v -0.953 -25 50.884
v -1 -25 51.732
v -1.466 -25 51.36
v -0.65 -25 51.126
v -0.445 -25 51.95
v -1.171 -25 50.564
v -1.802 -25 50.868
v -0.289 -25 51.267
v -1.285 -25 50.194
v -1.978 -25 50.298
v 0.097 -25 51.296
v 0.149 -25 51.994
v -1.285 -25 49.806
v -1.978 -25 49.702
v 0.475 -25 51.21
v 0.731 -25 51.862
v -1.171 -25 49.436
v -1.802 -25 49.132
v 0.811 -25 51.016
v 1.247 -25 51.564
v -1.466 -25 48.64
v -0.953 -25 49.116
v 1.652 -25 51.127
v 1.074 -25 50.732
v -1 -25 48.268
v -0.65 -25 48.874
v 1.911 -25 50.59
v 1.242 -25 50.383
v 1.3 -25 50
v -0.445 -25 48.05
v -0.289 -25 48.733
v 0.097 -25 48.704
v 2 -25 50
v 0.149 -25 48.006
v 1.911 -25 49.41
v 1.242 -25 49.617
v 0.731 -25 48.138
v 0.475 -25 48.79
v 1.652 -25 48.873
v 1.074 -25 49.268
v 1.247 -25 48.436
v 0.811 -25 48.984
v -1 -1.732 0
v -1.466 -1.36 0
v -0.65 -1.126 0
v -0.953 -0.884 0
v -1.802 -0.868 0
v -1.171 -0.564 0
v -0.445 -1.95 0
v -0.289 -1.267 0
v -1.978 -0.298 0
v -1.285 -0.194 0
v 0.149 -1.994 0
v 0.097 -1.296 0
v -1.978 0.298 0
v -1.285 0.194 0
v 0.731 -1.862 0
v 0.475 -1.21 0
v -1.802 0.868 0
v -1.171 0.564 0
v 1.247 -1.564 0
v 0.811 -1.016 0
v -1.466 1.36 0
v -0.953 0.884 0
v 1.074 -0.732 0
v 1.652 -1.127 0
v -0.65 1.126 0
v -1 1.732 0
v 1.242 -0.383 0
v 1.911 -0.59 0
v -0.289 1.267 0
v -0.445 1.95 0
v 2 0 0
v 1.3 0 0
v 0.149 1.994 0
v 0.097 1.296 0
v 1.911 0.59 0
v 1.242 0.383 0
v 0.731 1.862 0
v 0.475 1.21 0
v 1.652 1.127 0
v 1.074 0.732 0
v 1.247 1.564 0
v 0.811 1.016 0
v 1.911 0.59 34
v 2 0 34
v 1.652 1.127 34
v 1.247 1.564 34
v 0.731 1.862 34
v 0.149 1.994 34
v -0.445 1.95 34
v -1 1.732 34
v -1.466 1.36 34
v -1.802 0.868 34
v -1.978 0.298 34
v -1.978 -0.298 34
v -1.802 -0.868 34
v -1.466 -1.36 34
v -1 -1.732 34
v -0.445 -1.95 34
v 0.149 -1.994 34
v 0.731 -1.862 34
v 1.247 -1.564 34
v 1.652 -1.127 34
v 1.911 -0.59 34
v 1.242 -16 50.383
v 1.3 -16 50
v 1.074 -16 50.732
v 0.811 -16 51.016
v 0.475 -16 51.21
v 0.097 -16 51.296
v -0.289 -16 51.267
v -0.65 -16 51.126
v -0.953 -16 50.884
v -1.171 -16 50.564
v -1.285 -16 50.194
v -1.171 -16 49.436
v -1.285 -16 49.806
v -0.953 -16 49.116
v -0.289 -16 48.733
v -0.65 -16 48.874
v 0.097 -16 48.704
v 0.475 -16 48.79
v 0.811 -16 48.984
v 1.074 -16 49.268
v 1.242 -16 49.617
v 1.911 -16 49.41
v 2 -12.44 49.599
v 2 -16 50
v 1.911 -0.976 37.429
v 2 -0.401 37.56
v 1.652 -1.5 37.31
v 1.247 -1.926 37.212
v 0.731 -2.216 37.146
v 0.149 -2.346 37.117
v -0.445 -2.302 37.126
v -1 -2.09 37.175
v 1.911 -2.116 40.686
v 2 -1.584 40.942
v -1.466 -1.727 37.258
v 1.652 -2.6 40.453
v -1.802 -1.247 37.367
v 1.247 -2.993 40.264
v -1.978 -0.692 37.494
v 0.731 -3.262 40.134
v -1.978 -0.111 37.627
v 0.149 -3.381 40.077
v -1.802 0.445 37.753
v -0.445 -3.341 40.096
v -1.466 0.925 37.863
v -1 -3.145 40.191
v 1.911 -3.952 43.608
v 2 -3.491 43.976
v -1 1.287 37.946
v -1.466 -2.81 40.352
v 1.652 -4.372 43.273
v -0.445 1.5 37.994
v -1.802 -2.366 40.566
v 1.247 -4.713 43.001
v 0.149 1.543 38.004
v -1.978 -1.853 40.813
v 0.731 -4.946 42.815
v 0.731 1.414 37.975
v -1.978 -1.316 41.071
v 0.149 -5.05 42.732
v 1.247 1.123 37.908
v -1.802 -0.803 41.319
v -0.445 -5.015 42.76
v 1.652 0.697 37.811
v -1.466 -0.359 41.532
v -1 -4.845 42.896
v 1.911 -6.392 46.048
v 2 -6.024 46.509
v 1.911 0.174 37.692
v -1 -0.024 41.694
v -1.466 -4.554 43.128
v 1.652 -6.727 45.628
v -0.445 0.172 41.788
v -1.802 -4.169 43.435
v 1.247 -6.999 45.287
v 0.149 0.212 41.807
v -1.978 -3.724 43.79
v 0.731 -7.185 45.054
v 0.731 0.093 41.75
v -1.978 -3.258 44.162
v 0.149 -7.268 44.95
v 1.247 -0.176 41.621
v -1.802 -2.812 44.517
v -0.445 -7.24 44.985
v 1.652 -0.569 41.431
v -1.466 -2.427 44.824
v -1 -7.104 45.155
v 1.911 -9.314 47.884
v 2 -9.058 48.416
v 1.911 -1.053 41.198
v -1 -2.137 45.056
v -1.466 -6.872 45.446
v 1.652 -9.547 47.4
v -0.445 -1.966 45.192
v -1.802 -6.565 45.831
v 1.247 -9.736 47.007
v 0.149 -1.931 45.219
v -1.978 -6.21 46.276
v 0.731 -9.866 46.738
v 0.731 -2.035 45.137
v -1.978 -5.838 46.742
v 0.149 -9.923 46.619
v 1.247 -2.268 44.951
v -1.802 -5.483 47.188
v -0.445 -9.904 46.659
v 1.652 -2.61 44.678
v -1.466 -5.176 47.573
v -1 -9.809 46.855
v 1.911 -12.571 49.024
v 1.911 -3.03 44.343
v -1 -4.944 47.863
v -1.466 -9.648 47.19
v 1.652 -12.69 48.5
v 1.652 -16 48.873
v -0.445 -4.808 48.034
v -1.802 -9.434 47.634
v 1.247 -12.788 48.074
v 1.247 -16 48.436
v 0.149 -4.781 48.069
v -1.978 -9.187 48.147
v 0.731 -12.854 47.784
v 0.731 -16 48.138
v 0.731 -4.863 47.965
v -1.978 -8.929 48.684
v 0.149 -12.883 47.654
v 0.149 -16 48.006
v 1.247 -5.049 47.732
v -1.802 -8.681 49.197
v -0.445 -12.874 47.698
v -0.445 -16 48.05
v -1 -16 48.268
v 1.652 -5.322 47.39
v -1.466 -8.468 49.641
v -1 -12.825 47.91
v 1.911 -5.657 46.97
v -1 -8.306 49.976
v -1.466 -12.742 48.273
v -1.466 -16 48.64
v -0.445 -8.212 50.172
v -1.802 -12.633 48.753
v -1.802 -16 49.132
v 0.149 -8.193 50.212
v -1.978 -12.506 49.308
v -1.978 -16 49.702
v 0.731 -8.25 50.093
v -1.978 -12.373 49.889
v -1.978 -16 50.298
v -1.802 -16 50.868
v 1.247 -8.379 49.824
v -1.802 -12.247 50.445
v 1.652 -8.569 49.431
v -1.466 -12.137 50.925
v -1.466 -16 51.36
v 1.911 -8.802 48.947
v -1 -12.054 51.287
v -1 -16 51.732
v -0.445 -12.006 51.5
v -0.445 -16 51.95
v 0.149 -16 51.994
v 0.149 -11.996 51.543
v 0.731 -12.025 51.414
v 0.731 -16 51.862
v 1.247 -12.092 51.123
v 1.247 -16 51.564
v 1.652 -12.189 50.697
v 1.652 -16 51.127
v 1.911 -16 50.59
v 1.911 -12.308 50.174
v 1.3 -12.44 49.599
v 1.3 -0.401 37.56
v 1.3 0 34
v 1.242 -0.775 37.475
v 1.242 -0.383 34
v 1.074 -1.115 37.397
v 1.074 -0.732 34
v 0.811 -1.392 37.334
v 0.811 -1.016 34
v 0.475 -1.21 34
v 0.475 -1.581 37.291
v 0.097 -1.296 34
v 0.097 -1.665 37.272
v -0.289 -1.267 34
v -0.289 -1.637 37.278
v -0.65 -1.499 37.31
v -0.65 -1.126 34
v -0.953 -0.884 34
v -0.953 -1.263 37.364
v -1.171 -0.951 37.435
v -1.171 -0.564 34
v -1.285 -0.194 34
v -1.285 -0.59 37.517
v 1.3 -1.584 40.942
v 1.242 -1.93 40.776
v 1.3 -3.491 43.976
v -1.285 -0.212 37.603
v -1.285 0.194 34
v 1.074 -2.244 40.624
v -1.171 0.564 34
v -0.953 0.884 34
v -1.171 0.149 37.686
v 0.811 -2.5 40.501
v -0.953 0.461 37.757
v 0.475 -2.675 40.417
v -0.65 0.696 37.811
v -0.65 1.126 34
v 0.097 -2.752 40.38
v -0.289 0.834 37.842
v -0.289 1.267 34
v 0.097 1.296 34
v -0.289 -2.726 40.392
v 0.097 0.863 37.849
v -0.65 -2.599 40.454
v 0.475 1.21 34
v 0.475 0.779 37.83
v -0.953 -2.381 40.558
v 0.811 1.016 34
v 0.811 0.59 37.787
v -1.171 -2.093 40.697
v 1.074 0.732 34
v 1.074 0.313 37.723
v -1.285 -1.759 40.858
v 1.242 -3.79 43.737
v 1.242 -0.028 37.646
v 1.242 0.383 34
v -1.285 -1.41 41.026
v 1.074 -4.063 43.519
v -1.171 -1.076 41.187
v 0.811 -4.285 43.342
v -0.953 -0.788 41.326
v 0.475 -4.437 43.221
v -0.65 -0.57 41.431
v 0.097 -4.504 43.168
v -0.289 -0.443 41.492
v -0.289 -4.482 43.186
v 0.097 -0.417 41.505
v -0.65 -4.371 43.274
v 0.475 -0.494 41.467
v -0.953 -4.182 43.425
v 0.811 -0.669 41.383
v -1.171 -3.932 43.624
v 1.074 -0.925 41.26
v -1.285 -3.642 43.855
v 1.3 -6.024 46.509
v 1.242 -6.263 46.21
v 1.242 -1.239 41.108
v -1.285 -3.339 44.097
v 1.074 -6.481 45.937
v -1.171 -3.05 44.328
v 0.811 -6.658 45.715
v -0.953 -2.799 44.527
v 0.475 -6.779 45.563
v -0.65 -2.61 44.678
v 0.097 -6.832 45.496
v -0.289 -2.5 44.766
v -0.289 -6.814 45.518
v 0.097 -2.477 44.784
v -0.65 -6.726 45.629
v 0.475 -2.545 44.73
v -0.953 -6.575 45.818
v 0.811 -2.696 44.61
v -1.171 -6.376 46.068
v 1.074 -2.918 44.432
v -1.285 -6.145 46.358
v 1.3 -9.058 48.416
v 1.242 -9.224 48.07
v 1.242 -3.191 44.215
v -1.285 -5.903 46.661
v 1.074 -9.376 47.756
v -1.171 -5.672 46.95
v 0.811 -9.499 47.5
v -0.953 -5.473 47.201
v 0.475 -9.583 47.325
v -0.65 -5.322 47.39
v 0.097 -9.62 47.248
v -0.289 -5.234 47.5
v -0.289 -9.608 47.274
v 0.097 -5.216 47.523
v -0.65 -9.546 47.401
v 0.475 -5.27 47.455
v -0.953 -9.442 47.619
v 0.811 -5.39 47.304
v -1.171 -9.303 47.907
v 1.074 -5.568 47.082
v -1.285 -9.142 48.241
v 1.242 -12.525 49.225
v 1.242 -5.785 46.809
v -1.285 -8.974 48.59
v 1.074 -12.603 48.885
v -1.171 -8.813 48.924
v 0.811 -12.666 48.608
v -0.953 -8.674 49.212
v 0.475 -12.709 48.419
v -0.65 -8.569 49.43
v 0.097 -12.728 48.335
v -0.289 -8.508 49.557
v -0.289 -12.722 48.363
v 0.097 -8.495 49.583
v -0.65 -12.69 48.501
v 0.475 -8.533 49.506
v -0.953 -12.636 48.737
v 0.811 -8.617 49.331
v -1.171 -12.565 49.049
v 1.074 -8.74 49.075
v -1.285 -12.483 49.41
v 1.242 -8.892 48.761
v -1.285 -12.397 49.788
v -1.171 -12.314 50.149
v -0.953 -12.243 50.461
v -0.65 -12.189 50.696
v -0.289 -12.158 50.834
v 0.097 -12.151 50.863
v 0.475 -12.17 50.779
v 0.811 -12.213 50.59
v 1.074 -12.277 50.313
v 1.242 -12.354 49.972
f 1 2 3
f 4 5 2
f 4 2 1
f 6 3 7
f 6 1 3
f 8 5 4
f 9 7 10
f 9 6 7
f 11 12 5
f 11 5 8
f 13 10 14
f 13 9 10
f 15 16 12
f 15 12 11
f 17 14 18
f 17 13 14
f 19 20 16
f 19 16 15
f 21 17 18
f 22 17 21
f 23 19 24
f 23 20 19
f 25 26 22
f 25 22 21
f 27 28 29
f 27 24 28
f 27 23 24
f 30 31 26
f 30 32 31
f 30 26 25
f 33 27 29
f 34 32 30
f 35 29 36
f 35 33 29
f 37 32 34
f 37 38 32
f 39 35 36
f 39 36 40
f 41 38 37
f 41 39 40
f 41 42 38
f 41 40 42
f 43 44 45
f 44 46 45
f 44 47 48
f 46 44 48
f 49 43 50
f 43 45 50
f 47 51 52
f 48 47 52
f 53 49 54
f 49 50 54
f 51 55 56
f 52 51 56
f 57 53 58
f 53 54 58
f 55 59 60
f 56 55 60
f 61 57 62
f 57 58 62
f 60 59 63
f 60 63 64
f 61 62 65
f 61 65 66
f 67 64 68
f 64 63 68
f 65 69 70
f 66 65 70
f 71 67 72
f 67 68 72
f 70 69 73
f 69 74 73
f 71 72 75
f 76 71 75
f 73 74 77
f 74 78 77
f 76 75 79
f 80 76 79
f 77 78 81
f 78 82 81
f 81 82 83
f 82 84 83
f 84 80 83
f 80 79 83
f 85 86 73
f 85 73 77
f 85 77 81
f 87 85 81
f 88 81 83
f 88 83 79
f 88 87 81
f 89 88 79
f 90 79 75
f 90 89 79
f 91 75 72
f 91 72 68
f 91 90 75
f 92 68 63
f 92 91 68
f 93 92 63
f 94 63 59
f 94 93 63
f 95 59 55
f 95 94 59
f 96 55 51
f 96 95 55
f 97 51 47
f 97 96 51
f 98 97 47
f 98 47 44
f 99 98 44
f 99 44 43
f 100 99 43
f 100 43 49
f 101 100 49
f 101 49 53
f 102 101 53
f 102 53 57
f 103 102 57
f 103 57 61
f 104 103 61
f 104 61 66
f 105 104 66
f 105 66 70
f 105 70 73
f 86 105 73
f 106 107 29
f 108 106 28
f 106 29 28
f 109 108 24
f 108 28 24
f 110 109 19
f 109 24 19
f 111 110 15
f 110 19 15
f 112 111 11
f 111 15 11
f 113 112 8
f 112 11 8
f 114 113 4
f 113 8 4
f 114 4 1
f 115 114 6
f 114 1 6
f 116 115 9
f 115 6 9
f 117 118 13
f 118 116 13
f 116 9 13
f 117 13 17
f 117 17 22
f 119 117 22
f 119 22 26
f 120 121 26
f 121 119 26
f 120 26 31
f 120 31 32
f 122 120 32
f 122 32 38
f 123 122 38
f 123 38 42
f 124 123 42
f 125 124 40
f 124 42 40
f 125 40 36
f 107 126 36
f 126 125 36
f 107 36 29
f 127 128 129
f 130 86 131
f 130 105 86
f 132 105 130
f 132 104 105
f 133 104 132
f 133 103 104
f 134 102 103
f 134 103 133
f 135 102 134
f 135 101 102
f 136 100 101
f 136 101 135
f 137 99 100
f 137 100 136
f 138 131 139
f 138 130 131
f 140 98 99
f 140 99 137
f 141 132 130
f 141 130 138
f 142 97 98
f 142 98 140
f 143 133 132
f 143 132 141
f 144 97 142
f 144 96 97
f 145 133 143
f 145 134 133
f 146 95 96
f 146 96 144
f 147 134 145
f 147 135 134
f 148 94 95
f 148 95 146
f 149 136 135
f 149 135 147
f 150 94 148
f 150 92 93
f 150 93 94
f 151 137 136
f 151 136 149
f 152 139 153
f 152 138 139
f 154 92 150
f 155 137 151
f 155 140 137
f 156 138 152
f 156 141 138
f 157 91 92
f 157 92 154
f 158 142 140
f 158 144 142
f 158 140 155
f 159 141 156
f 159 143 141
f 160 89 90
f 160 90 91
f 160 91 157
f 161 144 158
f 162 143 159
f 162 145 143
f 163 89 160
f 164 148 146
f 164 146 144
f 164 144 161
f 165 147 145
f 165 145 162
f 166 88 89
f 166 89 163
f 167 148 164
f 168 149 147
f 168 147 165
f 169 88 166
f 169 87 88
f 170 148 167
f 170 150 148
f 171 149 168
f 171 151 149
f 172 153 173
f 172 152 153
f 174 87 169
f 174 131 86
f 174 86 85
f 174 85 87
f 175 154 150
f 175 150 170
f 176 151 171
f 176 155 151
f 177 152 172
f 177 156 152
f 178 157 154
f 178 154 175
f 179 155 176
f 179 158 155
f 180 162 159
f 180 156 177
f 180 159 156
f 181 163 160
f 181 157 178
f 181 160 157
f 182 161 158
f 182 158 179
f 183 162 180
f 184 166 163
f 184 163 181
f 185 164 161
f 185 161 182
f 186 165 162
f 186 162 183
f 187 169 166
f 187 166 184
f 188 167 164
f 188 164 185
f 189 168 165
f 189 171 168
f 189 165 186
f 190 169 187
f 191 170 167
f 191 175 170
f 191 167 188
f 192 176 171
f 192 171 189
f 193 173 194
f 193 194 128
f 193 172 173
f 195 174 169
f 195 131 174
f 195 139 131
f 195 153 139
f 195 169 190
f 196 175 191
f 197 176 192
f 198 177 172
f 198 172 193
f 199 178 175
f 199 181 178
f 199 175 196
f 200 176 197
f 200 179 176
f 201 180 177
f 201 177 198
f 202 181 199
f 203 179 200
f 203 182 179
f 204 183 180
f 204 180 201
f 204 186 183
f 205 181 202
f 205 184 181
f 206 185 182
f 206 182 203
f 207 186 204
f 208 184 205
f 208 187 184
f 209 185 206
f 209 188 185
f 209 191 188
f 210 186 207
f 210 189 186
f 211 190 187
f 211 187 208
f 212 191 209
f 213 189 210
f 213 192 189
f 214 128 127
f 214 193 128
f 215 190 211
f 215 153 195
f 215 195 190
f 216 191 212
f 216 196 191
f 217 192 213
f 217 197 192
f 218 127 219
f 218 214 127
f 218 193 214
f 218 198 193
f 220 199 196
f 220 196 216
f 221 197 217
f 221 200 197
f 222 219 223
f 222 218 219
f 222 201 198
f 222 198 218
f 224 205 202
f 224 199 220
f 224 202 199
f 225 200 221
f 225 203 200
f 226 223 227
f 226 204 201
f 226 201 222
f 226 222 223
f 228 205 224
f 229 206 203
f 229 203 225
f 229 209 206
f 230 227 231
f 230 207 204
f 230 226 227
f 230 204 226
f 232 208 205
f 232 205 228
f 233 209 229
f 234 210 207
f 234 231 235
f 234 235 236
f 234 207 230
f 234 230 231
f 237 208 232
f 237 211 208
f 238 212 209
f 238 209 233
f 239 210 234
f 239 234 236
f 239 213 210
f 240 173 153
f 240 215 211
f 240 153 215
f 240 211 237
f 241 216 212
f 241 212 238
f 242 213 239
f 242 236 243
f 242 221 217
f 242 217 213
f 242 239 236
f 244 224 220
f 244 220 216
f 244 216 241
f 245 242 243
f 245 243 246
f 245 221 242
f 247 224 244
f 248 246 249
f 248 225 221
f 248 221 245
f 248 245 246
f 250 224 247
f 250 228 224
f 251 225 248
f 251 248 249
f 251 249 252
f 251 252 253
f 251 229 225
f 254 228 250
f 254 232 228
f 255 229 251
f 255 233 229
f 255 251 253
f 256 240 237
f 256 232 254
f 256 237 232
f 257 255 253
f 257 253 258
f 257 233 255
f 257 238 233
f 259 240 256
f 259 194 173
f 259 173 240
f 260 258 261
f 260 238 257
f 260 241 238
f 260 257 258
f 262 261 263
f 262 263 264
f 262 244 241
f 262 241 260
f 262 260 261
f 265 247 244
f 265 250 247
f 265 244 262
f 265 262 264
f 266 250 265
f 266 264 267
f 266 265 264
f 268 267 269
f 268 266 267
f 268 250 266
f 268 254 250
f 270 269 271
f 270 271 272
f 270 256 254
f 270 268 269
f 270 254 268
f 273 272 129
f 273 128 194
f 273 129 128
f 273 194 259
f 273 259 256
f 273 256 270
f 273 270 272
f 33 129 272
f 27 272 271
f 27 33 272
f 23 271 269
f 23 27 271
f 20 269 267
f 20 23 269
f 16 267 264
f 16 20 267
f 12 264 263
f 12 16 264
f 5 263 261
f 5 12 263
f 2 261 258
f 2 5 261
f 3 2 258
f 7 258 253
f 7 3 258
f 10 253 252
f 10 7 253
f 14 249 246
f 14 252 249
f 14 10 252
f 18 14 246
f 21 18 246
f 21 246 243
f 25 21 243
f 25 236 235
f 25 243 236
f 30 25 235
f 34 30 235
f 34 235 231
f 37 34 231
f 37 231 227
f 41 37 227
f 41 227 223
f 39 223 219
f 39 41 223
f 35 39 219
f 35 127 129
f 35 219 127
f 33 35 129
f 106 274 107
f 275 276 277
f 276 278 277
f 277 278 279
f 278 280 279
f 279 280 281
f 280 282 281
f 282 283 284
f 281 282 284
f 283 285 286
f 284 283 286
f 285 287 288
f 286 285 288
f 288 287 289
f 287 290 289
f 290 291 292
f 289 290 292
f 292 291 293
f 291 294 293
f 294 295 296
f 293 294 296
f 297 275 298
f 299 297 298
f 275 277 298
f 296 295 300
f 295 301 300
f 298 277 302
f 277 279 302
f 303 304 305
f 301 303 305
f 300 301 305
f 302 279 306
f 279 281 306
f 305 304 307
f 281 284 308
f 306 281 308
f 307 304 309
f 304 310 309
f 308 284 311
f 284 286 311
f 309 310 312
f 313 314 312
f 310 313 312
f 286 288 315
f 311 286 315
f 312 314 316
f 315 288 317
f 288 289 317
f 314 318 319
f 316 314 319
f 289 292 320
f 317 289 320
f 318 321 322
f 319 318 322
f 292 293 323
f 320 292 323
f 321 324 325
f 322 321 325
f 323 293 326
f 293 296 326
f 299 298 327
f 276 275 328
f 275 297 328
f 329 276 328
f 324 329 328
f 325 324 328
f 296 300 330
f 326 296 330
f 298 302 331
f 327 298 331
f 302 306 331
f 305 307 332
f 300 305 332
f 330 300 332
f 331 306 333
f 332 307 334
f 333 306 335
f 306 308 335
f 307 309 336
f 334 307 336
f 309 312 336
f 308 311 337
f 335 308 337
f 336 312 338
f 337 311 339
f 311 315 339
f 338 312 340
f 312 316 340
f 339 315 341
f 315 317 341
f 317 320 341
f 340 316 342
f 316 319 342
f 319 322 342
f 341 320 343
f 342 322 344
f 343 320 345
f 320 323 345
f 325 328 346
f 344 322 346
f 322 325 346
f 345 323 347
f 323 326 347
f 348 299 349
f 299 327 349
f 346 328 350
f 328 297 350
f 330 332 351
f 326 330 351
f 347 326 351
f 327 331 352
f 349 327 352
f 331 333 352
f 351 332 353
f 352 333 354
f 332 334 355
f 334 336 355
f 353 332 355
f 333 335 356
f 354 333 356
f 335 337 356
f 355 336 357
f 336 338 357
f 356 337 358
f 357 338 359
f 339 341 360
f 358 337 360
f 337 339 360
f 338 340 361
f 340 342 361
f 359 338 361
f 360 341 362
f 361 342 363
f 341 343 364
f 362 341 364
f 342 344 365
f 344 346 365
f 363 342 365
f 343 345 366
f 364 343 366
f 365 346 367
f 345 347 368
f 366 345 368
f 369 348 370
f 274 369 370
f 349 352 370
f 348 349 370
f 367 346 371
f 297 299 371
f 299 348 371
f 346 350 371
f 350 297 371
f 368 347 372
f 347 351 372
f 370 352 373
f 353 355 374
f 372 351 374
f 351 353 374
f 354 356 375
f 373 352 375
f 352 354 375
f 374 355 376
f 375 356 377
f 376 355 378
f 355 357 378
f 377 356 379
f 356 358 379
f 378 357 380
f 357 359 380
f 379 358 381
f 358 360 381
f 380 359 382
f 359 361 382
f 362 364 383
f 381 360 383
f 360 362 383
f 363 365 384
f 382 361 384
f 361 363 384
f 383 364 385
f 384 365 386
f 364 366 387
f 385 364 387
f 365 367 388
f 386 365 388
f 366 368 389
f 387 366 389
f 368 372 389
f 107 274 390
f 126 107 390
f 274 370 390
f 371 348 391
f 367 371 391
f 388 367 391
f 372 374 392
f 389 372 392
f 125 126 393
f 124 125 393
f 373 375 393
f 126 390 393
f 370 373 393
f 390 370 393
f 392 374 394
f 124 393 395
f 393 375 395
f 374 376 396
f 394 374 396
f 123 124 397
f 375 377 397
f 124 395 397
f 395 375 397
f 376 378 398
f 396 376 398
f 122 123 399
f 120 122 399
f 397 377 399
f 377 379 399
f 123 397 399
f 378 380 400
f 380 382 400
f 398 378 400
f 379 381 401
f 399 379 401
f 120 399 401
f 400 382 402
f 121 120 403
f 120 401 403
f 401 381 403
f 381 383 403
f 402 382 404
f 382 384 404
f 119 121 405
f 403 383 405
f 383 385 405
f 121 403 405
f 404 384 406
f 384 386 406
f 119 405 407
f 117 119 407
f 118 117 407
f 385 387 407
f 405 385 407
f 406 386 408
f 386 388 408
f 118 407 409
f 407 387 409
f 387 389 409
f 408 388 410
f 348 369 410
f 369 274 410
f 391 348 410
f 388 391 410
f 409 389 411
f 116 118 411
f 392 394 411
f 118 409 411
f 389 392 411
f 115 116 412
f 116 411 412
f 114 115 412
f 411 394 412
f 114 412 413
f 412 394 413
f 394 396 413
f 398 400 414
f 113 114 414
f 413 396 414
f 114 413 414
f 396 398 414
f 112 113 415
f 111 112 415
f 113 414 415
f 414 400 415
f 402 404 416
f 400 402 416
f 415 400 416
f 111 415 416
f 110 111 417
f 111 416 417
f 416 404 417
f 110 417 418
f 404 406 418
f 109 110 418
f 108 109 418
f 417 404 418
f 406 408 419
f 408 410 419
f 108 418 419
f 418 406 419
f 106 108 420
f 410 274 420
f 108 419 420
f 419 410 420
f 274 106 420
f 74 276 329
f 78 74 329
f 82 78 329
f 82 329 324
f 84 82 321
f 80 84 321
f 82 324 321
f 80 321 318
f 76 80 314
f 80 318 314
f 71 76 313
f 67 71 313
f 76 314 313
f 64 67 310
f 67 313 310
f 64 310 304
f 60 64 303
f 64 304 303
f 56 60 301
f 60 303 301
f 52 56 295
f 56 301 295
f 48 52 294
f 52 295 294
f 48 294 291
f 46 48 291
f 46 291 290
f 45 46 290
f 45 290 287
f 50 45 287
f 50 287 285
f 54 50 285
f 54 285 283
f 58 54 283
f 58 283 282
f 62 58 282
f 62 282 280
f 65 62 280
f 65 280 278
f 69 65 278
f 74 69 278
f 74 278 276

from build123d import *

# Parameters (mm, degrees)
F0_R   = 2
F0_R_2 = 1.3


with BuildPart() as f2:
    # F2: sweep along a path in F1
    with BuildLine(Plane.YZ) as f2_path:
        Line((0, 0), (0, 34))
        ThreePointArc((0, 34), (-4.686291501, 45.313708499), (-16, 50))
        Line((-16, 50), (-25, 50))
    # F0 (on Top) → F2 (sweep)
    with BuildSketch(Plane.XY):
        Circle(F0_R)
        Circle(F0_R_2, mode=Mode.SUBTRACT)
    sweep(path=f2_path.line)


solid = f2.part
